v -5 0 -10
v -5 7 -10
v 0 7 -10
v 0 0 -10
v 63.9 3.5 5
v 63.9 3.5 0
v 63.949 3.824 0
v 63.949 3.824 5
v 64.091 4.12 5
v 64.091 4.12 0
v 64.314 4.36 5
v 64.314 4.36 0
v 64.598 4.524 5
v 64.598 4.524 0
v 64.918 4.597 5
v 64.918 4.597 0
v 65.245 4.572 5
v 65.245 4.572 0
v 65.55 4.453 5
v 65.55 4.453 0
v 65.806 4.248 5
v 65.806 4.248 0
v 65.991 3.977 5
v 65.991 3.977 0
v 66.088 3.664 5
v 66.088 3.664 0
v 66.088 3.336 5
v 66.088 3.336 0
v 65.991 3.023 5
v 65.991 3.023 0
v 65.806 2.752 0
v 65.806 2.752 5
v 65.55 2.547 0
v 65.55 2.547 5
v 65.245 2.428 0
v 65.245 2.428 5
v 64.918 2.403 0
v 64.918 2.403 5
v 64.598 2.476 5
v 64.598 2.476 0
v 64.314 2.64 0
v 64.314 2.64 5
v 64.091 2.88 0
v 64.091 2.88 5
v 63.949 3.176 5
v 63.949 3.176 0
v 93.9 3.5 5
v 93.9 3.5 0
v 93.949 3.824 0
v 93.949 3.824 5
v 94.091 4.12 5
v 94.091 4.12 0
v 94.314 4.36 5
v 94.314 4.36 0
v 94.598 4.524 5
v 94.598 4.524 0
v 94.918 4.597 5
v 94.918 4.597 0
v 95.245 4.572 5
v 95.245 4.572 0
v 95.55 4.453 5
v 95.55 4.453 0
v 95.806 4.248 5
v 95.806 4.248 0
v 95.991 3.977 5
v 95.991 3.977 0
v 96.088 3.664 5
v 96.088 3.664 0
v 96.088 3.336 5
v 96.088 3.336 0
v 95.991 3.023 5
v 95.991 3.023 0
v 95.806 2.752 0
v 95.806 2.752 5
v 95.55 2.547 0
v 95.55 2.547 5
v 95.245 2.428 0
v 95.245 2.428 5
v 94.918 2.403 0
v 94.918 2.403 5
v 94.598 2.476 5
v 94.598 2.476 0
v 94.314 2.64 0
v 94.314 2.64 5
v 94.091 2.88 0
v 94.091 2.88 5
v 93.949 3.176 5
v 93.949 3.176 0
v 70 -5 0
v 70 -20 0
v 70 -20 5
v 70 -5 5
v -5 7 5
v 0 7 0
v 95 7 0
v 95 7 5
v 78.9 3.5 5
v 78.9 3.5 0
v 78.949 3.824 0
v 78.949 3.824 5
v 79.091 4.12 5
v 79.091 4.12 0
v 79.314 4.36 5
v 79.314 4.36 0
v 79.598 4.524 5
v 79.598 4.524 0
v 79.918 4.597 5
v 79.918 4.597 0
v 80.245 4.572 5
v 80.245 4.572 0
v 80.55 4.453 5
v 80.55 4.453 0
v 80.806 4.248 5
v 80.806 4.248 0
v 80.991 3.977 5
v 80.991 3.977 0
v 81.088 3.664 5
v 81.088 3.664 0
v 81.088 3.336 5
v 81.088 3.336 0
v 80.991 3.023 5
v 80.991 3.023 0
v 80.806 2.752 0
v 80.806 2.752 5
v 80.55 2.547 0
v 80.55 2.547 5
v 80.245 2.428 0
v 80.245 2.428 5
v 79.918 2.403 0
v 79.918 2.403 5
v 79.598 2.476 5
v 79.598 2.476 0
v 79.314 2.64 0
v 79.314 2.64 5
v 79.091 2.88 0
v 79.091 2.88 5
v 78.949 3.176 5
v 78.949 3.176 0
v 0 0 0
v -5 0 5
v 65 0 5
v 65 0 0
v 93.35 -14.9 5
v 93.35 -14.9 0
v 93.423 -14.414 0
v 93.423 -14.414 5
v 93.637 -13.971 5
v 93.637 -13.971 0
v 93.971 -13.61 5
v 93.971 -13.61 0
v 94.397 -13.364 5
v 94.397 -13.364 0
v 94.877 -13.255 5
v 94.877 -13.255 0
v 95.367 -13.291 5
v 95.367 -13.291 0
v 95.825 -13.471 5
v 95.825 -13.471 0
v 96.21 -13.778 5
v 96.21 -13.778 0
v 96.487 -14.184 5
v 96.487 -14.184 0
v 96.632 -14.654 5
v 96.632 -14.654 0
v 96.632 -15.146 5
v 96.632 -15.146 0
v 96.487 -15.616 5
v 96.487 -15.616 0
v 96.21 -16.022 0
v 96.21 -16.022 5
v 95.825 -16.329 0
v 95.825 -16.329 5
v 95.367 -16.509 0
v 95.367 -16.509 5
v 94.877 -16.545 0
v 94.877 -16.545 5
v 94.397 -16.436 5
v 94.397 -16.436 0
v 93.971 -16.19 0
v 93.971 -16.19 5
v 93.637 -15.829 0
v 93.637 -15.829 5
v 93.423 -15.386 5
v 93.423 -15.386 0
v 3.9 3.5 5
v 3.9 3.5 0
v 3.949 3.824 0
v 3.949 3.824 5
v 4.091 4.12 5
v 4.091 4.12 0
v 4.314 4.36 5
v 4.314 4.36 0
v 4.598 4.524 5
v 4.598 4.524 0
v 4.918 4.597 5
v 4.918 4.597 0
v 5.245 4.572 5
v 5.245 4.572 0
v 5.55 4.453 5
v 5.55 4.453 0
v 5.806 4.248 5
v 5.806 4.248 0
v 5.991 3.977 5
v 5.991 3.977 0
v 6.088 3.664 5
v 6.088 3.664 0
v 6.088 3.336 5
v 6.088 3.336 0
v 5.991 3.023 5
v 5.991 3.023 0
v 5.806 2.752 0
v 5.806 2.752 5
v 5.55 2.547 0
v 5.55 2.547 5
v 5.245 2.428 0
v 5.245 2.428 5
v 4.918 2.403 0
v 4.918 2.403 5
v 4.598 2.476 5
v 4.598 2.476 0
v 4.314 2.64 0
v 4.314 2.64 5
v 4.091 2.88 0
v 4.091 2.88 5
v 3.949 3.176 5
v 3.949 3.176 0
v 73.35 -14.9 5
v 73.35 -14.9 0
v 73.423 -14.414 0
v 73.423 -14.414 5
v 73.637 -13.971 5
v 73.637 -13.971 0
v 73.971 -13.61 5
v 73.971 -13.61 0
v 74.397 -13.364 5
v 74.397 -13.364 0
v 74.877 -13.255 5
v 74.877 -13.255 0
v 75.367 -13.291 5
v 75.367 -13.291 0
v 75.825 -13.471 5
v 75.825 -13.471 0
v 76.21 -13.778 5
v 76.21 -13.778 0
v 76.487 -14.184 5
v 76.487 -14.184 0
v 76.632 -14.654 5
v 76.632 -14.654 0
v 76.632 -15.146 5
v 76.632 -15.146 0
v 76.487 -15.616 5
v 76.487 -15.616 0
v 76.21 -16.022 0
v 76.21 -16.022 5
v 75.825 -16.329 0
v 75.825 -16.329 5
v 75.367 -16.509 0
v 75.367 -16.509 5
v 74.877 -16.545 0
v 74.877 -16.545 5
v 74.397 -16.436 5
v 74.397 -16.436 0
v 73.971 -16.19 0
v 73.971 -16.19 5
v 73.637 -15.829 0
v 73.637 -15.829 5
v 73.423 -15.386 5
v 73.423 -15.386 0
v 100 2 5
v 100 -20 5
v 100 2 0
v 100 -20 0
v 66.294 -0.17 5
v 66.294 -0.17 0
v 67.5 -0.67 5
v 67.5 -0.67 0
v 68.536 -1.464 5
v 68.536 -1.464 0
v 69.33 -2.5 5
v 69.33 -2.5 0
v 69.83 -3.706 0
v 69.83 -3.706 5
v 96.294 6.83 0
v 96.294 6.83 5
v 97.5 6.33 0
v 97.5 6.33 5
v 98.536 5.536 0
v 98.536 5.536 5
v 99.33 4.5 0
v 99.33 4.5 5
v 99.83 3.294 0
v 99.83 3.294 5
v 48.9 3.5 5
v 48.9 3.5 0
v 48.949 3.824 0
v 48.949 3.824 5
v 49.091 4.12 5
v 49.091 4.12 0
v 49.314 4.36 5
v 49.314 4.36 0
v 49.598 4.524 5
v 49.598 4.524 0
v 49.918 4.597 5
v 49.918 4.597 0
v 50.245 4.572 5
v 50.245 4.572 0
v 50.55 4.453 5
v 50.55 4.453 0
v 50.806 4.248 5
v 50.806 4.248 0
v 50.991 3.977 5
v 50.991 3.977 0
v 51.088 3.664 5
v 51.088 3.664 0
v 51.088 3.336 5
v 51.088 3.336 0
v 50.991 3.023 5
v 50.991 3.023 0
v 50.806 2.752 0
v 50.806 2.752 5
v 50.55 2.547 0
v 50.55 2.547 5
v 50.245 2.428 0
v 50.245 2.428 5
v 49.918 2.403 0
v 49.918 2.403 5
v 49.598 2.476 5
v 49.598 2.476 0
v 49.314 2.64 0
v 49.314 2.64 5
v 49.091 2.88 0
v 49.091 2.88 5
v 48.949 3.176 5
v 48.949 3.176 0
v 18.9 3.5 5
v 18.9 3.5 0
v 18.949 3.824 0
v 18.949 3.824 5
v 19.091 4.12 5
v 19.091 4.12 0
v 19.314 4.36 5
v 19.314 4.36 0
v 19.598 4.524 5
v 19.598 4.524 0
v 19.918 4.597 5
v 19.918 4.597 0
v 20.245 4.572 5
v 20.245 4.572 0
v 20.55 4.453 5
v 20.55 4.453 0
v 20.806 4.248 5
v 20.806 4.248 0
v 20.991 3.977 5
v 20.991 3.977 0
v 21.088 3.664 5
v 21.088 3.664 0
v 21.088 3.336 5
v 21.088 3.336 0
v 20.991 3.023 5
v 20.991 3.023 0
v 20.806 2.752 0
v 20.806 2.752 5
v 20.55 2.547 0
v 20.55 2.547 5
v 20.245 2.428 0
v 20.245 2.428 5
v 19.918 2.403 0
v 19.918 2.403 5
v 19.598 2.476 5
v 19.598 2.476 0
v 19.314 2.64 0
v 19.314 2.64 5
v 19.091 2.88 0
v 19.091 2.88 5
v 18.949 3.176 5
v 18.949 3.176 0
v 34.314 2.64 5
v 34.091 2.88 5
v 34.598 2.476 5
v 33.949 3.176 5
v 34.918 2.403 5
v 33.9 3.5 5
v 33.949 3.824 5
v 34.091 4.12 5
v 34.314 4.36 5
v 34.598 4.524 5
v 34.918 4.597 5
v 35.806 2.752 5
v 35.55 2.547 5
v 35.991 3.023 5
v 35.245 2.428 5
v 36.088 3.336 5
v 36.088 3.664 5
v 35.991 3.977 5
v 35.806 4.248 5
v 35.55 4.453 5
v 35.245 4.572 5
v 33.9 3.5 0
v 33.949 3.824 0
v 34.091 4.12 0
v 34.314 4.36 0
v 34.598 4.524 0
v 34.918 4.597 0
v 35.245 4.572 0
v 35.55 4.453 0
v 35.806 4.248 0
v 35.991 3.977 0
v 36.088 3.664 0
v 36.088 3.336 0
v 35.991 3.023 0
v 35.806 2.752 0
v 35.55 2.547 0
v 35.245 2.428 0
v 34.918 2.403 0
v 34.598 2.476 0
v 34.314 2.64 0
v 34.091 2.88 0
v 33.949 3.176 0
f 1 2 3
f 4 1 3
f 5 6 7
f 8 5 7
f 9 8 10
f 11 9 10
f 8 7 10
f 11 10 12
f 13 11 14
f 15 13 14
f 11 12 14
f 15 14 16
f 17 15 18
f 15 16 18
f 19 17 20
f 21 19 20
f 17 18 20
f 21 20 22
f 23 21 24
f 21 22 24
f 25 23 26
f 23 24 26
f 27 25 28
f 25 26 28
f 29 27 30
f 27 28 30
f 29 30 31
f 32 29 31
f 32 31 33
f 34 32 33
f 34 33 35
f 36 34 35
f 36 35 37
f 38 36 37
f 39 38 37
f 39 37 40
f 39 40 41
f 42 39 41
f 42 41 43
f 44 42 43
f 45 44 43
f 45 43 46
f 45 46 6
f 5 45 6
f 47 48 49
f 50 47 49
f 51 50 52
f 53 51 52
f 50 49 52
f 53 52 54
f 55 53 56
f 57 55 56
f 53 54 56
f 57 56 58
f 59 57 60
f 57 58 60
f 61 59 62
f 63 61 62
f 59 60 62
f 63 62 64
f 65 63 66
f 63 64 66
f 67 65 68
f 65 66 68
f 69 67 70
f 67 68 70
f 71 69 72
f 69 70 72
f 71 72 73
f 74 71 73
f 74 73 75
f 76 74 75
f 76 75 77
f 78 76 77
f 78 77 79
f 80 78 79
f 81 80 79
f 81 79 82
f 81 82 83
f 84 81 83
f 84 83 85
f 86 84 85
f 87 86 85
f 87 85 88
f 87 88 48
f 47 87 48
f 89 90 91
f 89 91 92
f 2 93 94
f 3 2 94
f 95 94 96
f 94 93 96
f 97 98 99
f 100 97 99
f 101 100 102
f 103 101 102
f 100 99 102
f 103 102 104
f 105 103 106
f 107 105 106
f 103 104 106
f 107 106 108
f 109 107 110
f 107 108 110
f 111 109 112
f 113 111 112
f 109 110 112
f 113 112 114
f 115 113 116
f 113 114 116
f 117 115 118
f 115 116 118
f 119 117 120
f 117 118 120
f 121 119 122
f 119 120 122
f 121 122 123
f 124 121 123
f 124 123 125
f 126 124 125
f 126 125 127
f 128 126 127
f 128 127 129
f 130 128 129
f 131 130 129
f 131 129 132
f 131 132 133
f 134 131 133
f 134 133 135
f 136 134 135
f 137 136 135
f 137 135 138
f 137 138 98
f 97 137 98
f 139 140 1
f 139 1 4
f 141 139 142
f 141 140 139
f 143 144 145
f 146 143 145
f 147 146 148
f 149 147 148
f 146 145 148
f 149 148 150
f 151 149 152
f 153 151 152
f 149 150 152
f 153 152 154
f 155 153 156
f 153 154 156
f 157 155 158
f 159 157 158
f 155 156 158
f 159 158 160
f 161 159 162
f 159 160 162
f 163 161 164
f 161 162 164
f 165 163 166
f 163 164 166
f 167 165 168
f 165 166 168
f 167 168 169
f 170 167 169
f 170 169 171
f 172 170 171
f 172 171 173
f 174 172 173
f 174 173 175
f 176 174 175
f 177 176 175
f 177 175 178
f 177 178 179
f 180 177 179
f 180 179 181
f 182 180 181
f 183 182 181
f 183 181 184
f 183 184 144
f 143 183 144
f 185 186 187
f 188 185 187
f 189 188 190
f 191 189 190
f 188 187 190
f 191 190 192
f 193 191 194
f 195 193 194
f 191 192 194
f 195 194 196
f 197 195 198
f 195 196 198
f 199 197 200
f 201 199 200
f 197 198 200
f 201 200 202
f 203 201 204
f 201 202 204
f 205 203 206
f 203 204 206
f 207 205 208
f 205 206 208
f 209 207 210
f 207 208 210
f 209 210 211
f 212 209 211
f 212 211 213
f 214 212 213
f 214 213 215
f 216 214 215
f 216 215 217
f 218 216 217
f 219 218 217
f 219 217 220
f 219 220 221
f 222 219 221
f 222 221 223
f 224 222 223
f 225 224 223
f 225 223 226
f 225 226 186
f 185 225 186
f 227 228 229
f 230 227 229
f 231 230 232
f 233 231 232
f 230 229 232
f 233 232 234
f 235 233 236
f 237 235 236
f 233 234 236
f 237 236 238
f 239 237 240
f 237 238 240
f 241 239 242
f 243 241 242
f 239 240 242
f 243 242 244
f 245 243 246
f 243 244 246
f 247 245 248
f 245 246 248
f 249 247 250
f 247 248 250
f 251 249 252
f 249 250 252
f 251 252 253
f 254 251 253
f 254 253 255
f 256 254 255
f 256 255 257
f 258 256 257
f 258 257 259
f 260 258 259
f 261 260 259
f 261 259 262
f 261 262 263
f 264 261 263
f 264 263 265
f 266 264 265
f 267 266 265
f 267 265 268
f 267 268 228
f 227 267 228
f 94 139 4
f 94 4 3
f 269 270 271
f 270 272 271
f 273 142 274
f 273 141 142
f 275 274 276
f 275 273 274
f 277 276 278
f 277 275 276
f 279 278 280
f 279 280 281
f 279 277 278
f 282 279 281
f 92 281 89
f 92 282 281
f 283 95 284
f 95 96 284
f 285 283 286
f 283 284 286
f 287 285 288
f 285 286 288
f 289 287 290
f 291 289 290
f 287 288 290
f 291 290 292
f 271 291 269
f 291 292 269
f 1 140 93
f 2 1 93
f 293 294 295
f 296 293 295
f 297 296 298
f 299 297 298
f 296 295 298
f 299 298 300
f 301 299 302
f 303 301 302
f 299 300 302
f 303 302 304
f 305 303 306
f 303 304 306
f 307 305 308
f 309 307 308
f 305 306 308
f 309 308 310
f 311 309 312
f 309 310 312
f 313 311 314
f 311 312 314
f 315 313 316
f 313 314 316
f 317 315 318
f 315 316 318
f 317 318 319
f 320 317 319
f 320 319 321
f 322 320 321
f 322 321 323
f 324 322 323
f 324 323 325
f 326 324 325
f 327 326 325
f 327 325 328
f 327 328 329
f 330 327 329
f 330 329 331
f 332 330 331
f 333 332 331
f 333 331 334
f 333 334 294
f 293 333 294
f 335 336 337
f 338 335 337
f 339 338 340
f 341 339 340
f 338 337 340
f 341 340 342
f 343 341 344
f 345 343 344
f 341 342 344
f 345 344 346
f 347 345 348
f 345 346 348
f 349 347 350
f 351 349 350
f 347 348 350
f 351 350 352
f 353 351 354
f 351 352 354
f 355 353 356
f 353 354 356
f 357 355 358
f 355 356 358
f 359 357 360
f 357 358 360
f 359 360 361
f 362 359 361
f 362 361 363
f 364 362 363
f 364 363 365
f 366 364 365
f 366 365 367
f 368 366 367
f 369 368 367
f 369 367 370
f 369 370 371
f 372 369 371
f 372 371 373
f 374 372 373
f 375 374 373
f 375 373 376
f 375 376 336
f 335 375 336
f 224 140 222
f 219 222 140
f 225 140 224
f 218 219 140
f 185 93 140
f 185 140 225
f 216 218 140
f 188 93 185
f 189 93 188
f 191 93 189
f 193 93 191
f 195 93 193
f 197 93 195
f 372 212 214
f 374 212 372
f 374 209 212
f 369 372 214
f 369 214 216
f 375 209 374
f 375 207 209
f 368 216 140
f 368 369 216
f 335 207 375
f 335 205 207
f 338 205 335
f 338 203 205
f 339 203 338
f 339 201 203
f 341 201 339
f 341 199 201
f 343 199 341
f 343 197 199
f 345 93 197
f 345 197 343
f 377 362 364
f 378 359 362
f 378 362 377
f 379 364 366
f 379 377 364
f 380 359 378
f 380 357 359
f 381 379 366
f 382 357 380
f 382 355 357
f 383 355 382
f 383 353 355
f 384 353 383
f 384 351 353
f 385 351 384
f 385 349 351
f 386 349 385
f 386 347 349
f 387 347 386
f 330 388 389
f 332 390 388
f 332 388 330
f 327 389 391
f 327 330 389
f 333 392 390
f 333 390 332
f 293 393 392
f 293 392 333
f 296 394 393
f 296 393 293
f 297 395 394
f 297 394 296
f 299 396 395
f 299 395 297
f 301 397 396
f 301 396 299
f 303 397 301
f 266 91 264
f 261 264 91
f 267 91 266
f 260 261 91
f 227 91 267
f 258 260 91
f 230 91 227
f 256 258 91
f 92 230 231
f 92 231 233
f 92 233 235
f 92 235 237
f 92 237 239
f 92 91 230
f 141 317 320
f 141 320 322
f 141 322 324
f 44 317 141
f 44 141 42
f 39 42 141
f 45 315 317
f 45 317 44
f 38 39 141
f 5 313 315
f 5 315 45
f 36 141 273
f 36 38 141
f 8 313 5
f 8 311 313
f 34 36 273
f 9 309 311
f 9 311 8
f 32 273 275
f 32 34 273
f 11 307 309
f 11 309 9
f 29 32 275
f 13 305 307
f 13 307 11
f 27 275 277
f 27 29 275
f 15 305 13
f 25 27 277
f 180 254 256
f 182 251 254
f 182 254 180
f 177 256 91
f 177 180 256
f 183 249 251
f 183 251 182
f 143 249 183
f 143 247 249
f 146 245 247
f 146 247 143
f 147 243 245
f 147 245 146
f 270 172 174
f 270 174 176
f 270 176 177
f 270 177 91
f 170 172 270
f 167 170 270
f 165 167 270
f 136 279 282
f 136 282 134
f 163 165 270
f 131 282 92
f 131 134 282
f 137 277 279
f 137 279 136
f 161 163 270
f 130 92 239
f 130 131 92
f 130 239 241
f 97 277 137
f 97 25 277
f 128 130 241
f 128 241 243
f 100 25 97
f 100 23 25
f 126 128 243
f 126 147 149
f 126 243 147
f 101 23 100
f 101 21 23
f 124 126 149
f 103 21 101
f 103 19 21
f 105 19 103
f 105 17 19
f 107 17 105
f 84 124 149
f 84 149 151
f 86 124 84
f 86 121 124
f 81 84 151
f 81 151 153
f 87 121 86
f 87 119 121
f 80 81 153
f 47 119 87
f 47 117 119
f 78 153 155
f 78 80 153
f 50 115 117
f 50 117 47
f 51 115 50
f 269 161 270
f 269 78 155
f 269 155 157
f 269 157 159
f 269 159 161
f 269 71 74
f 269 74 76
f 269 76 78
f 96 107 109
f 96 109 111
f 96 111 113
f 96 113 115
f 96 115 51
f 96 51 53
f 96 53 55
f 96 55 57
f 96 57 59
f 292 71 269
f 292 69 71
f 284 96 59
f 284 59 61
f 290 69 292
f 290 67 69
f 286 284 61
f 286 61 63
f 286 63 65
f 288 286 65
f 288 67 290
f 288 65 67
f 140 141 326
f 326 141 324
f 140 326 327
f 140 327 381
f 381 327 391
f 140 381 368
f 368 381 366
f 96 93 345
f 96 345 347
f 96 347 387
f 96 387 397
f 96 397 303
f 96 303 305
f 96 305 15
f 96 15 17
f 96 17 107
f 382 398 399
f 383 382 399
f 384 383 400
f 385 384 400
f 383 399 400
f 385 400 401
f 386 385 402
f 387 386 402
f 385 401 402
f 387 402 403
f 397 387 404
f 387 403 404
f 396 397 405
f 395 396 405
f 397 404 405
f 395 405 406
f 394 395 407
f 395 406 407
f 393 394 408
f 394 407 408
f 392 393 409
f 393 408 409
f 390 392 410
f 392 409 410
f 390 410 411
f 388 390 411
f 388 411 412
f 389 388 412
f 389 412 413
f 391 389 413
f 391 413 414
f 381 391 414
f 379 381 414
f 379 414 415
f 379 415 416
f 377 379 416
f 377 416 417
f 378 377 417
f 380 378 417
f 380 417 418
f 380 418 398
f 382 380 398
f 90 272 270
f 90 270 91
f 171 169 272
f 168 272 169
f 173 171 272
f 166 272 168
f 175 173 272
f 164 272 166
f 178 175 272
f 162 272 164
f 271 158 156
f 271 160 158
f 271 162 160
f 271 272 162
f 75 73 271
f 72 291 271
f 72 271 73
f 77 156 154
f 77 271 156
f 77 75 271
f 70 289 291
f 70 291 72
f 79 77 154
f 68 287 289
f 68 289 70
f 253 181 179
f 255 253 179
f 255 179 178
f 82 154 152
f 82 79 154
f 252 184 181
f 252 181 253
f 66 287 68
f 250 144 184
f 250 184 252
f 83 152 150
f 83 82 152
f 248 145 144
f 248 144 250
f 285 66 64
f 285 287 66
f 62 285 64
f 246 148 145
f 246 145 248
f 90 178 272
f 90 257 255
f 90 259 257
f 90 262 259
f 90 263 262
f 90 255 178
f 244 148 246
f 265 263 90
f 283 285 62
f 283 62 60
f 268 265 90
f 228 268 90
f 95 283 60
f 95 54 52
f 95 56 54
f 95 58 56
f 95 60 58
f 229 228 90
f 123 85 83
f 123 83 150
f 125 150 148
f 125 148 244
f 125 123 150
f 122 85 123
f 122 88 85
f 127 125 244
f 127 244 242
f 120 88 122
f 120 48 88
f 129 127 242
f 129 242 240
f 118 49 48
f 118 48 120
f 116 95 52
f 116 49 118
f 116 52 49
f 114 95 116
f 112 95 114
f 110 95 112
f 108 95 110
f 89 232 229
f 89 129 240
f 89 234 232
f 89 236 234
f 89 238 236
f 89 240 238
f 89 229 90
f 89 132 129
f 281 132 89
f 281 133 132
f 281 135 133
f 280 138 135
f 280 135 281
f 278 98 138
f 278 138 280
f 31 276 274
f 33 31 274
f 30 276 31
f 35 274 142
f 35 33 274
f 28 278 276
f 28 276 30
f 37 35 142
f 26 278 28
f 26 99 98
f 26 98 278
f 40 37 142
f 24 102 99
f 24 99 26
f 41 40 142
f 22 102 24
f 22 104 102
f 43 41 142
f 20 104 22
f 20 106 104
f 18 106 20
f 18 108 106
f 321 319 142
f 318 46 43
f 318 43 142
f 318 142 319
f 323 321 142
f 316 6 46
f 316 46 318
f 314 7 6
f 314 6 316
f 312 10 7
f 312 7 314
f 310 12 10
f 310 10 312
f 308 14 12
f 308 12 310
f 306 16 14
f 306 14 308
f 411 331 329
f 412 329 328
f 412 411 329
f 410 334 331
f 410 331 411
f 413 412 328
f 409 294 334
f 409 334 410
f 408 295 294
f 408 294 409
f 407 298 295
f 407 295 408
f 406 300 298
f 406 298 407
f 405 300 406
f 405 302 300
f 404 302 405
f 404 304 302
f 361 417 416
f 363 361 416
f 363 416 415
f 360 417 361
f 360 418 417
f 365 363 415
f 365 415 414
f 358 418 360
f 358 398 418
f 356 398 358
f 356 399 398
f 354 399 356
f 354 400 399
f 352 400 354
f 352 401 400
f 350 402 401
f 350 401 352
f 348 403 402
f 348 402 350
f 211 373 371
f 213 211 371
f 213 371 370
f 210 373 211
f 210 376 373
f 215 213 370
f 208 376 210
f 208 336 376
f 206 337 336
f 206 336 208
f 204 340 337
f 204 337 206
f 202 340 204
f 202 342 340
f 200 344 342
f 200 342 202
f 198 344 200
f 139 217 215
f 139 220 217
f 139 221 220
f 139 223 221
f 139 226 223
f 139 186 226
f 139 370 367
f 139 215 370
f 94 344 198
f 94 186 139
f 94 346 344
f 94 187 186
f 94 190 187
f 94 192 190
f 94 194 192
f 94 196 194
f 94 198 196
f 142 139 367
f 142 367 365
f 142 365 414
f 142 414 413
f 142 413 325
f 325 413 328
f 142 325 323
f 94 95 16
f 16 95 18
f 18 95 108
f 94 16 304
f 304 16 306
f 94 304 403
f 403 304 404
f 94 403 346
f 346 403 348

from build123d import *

# Parameters (mm, degrees)
SKETCH_1_W          = 100
SKETCH_1_H          = 7
EXTRUDE_1_DEPTH     = 5
SKETCH_2_R          = 1.1
CUT_EXTRUDE_1_DEPTH = 101.369318021
SKETCH_3_W          = 30
SKETCH_3_H          = 20
EXTRUDE_2_DEPTH     = 5
SKETCH_4_W          = 5
SKETCH_4_H          = 7
EXTRUDE_3_DEPTH     = 15
SKETCH_5_R          = 1.65
CUT_EXTRUDE_2_DEPTH = 15
FILLET_1_R          = 5


with BuildPart() as part:
    # 草图1 → 凸台-拉伸1 (new body)
    with BuildSketch(Plane.XY):
        with Locations((50, 3.5)):
            Rectangle(SKETCH_1_W, SKETCH_1_H)
    extrude(amount=EXTRUDE_1_DEPTH)

    # 草图2 → 切除-拉伸1 (cut, through all)
    with BuildSketch(Plane(origin=(0, 0, 0), x_dir=(-1, 0, 0), z_dir=(0, 0, -1))):
        with Locations((-95, 3.5)):
            Circle(SKETCH_2_R)
        with Locations((-80, 3.5)):
            Circle(SKETCH_2_R)
        with Locations((-65, 3.5)):
            Circle(SKETCH_2_R)
        with Locations((-50, 3.5)):
            Circle(SKETCH_2_R)
        with Locations((-35, 3.5)):
            Circle(SKETCH_2_R)
        with Locations((-20, 3.5)):
            Circle(SKETCH_2_R)
        with Locations((-5, 3.5)):
            Circle(SKETCH_2_R)
    extrude(amount=-CUT_EXTRUDE_1_DEPTH, mode=Mode.SUBTRACT)

    # 草图3 → 凸台-拉伸2 (add)
    with BuildSketch(Plane(origin=(0, 0, 0), x_dir=(-1, 0, 0), z_dir=(0, 0, -1))):
        with Locations((-85, -10)):
            Rectangle(SKETCH_3_W, SKETCH_3_H)
    extrude(amount=-EXTRUDE_2_DEPTH)

    # 草图4 → 凸台-拉伸3 (add)
    with BuildSketch(Plane.XY.offset(5)):
        with Locations((-2.5, 3.5)):
            Rectangle(SKETCH_4_W, SKETCH_4_H)
    extrude(amount=-EXTRUDE_3_DEPTH)

    # 草图5 → 切除-拉伸2 (cut)
    with BuildSketch(Plane(origin=(0, 0, 0), x_dir=(-1, 0, 0), z_dir=(0, 0, -1))):
        with Locations((-95, -14.9)):
            Circle(SKETCH_5_R)
        with Locations((-75, -14.9)):
            Circle(SKETCH_5_R)
    extrude(amount=-CUT_EXTRUDE_2_DEPTH, mode=Mode.SUBTRACT)

    # 圆角1
    fillet_1_edges = [part.edges().sort_by_distance(p)[0] for p in [
        (70, 0, 2.5),
        (100, 7, 2.5),
    ]]
    fillet(fillet_1_edges, radius=FILLET_1_R)


solid = part.part
